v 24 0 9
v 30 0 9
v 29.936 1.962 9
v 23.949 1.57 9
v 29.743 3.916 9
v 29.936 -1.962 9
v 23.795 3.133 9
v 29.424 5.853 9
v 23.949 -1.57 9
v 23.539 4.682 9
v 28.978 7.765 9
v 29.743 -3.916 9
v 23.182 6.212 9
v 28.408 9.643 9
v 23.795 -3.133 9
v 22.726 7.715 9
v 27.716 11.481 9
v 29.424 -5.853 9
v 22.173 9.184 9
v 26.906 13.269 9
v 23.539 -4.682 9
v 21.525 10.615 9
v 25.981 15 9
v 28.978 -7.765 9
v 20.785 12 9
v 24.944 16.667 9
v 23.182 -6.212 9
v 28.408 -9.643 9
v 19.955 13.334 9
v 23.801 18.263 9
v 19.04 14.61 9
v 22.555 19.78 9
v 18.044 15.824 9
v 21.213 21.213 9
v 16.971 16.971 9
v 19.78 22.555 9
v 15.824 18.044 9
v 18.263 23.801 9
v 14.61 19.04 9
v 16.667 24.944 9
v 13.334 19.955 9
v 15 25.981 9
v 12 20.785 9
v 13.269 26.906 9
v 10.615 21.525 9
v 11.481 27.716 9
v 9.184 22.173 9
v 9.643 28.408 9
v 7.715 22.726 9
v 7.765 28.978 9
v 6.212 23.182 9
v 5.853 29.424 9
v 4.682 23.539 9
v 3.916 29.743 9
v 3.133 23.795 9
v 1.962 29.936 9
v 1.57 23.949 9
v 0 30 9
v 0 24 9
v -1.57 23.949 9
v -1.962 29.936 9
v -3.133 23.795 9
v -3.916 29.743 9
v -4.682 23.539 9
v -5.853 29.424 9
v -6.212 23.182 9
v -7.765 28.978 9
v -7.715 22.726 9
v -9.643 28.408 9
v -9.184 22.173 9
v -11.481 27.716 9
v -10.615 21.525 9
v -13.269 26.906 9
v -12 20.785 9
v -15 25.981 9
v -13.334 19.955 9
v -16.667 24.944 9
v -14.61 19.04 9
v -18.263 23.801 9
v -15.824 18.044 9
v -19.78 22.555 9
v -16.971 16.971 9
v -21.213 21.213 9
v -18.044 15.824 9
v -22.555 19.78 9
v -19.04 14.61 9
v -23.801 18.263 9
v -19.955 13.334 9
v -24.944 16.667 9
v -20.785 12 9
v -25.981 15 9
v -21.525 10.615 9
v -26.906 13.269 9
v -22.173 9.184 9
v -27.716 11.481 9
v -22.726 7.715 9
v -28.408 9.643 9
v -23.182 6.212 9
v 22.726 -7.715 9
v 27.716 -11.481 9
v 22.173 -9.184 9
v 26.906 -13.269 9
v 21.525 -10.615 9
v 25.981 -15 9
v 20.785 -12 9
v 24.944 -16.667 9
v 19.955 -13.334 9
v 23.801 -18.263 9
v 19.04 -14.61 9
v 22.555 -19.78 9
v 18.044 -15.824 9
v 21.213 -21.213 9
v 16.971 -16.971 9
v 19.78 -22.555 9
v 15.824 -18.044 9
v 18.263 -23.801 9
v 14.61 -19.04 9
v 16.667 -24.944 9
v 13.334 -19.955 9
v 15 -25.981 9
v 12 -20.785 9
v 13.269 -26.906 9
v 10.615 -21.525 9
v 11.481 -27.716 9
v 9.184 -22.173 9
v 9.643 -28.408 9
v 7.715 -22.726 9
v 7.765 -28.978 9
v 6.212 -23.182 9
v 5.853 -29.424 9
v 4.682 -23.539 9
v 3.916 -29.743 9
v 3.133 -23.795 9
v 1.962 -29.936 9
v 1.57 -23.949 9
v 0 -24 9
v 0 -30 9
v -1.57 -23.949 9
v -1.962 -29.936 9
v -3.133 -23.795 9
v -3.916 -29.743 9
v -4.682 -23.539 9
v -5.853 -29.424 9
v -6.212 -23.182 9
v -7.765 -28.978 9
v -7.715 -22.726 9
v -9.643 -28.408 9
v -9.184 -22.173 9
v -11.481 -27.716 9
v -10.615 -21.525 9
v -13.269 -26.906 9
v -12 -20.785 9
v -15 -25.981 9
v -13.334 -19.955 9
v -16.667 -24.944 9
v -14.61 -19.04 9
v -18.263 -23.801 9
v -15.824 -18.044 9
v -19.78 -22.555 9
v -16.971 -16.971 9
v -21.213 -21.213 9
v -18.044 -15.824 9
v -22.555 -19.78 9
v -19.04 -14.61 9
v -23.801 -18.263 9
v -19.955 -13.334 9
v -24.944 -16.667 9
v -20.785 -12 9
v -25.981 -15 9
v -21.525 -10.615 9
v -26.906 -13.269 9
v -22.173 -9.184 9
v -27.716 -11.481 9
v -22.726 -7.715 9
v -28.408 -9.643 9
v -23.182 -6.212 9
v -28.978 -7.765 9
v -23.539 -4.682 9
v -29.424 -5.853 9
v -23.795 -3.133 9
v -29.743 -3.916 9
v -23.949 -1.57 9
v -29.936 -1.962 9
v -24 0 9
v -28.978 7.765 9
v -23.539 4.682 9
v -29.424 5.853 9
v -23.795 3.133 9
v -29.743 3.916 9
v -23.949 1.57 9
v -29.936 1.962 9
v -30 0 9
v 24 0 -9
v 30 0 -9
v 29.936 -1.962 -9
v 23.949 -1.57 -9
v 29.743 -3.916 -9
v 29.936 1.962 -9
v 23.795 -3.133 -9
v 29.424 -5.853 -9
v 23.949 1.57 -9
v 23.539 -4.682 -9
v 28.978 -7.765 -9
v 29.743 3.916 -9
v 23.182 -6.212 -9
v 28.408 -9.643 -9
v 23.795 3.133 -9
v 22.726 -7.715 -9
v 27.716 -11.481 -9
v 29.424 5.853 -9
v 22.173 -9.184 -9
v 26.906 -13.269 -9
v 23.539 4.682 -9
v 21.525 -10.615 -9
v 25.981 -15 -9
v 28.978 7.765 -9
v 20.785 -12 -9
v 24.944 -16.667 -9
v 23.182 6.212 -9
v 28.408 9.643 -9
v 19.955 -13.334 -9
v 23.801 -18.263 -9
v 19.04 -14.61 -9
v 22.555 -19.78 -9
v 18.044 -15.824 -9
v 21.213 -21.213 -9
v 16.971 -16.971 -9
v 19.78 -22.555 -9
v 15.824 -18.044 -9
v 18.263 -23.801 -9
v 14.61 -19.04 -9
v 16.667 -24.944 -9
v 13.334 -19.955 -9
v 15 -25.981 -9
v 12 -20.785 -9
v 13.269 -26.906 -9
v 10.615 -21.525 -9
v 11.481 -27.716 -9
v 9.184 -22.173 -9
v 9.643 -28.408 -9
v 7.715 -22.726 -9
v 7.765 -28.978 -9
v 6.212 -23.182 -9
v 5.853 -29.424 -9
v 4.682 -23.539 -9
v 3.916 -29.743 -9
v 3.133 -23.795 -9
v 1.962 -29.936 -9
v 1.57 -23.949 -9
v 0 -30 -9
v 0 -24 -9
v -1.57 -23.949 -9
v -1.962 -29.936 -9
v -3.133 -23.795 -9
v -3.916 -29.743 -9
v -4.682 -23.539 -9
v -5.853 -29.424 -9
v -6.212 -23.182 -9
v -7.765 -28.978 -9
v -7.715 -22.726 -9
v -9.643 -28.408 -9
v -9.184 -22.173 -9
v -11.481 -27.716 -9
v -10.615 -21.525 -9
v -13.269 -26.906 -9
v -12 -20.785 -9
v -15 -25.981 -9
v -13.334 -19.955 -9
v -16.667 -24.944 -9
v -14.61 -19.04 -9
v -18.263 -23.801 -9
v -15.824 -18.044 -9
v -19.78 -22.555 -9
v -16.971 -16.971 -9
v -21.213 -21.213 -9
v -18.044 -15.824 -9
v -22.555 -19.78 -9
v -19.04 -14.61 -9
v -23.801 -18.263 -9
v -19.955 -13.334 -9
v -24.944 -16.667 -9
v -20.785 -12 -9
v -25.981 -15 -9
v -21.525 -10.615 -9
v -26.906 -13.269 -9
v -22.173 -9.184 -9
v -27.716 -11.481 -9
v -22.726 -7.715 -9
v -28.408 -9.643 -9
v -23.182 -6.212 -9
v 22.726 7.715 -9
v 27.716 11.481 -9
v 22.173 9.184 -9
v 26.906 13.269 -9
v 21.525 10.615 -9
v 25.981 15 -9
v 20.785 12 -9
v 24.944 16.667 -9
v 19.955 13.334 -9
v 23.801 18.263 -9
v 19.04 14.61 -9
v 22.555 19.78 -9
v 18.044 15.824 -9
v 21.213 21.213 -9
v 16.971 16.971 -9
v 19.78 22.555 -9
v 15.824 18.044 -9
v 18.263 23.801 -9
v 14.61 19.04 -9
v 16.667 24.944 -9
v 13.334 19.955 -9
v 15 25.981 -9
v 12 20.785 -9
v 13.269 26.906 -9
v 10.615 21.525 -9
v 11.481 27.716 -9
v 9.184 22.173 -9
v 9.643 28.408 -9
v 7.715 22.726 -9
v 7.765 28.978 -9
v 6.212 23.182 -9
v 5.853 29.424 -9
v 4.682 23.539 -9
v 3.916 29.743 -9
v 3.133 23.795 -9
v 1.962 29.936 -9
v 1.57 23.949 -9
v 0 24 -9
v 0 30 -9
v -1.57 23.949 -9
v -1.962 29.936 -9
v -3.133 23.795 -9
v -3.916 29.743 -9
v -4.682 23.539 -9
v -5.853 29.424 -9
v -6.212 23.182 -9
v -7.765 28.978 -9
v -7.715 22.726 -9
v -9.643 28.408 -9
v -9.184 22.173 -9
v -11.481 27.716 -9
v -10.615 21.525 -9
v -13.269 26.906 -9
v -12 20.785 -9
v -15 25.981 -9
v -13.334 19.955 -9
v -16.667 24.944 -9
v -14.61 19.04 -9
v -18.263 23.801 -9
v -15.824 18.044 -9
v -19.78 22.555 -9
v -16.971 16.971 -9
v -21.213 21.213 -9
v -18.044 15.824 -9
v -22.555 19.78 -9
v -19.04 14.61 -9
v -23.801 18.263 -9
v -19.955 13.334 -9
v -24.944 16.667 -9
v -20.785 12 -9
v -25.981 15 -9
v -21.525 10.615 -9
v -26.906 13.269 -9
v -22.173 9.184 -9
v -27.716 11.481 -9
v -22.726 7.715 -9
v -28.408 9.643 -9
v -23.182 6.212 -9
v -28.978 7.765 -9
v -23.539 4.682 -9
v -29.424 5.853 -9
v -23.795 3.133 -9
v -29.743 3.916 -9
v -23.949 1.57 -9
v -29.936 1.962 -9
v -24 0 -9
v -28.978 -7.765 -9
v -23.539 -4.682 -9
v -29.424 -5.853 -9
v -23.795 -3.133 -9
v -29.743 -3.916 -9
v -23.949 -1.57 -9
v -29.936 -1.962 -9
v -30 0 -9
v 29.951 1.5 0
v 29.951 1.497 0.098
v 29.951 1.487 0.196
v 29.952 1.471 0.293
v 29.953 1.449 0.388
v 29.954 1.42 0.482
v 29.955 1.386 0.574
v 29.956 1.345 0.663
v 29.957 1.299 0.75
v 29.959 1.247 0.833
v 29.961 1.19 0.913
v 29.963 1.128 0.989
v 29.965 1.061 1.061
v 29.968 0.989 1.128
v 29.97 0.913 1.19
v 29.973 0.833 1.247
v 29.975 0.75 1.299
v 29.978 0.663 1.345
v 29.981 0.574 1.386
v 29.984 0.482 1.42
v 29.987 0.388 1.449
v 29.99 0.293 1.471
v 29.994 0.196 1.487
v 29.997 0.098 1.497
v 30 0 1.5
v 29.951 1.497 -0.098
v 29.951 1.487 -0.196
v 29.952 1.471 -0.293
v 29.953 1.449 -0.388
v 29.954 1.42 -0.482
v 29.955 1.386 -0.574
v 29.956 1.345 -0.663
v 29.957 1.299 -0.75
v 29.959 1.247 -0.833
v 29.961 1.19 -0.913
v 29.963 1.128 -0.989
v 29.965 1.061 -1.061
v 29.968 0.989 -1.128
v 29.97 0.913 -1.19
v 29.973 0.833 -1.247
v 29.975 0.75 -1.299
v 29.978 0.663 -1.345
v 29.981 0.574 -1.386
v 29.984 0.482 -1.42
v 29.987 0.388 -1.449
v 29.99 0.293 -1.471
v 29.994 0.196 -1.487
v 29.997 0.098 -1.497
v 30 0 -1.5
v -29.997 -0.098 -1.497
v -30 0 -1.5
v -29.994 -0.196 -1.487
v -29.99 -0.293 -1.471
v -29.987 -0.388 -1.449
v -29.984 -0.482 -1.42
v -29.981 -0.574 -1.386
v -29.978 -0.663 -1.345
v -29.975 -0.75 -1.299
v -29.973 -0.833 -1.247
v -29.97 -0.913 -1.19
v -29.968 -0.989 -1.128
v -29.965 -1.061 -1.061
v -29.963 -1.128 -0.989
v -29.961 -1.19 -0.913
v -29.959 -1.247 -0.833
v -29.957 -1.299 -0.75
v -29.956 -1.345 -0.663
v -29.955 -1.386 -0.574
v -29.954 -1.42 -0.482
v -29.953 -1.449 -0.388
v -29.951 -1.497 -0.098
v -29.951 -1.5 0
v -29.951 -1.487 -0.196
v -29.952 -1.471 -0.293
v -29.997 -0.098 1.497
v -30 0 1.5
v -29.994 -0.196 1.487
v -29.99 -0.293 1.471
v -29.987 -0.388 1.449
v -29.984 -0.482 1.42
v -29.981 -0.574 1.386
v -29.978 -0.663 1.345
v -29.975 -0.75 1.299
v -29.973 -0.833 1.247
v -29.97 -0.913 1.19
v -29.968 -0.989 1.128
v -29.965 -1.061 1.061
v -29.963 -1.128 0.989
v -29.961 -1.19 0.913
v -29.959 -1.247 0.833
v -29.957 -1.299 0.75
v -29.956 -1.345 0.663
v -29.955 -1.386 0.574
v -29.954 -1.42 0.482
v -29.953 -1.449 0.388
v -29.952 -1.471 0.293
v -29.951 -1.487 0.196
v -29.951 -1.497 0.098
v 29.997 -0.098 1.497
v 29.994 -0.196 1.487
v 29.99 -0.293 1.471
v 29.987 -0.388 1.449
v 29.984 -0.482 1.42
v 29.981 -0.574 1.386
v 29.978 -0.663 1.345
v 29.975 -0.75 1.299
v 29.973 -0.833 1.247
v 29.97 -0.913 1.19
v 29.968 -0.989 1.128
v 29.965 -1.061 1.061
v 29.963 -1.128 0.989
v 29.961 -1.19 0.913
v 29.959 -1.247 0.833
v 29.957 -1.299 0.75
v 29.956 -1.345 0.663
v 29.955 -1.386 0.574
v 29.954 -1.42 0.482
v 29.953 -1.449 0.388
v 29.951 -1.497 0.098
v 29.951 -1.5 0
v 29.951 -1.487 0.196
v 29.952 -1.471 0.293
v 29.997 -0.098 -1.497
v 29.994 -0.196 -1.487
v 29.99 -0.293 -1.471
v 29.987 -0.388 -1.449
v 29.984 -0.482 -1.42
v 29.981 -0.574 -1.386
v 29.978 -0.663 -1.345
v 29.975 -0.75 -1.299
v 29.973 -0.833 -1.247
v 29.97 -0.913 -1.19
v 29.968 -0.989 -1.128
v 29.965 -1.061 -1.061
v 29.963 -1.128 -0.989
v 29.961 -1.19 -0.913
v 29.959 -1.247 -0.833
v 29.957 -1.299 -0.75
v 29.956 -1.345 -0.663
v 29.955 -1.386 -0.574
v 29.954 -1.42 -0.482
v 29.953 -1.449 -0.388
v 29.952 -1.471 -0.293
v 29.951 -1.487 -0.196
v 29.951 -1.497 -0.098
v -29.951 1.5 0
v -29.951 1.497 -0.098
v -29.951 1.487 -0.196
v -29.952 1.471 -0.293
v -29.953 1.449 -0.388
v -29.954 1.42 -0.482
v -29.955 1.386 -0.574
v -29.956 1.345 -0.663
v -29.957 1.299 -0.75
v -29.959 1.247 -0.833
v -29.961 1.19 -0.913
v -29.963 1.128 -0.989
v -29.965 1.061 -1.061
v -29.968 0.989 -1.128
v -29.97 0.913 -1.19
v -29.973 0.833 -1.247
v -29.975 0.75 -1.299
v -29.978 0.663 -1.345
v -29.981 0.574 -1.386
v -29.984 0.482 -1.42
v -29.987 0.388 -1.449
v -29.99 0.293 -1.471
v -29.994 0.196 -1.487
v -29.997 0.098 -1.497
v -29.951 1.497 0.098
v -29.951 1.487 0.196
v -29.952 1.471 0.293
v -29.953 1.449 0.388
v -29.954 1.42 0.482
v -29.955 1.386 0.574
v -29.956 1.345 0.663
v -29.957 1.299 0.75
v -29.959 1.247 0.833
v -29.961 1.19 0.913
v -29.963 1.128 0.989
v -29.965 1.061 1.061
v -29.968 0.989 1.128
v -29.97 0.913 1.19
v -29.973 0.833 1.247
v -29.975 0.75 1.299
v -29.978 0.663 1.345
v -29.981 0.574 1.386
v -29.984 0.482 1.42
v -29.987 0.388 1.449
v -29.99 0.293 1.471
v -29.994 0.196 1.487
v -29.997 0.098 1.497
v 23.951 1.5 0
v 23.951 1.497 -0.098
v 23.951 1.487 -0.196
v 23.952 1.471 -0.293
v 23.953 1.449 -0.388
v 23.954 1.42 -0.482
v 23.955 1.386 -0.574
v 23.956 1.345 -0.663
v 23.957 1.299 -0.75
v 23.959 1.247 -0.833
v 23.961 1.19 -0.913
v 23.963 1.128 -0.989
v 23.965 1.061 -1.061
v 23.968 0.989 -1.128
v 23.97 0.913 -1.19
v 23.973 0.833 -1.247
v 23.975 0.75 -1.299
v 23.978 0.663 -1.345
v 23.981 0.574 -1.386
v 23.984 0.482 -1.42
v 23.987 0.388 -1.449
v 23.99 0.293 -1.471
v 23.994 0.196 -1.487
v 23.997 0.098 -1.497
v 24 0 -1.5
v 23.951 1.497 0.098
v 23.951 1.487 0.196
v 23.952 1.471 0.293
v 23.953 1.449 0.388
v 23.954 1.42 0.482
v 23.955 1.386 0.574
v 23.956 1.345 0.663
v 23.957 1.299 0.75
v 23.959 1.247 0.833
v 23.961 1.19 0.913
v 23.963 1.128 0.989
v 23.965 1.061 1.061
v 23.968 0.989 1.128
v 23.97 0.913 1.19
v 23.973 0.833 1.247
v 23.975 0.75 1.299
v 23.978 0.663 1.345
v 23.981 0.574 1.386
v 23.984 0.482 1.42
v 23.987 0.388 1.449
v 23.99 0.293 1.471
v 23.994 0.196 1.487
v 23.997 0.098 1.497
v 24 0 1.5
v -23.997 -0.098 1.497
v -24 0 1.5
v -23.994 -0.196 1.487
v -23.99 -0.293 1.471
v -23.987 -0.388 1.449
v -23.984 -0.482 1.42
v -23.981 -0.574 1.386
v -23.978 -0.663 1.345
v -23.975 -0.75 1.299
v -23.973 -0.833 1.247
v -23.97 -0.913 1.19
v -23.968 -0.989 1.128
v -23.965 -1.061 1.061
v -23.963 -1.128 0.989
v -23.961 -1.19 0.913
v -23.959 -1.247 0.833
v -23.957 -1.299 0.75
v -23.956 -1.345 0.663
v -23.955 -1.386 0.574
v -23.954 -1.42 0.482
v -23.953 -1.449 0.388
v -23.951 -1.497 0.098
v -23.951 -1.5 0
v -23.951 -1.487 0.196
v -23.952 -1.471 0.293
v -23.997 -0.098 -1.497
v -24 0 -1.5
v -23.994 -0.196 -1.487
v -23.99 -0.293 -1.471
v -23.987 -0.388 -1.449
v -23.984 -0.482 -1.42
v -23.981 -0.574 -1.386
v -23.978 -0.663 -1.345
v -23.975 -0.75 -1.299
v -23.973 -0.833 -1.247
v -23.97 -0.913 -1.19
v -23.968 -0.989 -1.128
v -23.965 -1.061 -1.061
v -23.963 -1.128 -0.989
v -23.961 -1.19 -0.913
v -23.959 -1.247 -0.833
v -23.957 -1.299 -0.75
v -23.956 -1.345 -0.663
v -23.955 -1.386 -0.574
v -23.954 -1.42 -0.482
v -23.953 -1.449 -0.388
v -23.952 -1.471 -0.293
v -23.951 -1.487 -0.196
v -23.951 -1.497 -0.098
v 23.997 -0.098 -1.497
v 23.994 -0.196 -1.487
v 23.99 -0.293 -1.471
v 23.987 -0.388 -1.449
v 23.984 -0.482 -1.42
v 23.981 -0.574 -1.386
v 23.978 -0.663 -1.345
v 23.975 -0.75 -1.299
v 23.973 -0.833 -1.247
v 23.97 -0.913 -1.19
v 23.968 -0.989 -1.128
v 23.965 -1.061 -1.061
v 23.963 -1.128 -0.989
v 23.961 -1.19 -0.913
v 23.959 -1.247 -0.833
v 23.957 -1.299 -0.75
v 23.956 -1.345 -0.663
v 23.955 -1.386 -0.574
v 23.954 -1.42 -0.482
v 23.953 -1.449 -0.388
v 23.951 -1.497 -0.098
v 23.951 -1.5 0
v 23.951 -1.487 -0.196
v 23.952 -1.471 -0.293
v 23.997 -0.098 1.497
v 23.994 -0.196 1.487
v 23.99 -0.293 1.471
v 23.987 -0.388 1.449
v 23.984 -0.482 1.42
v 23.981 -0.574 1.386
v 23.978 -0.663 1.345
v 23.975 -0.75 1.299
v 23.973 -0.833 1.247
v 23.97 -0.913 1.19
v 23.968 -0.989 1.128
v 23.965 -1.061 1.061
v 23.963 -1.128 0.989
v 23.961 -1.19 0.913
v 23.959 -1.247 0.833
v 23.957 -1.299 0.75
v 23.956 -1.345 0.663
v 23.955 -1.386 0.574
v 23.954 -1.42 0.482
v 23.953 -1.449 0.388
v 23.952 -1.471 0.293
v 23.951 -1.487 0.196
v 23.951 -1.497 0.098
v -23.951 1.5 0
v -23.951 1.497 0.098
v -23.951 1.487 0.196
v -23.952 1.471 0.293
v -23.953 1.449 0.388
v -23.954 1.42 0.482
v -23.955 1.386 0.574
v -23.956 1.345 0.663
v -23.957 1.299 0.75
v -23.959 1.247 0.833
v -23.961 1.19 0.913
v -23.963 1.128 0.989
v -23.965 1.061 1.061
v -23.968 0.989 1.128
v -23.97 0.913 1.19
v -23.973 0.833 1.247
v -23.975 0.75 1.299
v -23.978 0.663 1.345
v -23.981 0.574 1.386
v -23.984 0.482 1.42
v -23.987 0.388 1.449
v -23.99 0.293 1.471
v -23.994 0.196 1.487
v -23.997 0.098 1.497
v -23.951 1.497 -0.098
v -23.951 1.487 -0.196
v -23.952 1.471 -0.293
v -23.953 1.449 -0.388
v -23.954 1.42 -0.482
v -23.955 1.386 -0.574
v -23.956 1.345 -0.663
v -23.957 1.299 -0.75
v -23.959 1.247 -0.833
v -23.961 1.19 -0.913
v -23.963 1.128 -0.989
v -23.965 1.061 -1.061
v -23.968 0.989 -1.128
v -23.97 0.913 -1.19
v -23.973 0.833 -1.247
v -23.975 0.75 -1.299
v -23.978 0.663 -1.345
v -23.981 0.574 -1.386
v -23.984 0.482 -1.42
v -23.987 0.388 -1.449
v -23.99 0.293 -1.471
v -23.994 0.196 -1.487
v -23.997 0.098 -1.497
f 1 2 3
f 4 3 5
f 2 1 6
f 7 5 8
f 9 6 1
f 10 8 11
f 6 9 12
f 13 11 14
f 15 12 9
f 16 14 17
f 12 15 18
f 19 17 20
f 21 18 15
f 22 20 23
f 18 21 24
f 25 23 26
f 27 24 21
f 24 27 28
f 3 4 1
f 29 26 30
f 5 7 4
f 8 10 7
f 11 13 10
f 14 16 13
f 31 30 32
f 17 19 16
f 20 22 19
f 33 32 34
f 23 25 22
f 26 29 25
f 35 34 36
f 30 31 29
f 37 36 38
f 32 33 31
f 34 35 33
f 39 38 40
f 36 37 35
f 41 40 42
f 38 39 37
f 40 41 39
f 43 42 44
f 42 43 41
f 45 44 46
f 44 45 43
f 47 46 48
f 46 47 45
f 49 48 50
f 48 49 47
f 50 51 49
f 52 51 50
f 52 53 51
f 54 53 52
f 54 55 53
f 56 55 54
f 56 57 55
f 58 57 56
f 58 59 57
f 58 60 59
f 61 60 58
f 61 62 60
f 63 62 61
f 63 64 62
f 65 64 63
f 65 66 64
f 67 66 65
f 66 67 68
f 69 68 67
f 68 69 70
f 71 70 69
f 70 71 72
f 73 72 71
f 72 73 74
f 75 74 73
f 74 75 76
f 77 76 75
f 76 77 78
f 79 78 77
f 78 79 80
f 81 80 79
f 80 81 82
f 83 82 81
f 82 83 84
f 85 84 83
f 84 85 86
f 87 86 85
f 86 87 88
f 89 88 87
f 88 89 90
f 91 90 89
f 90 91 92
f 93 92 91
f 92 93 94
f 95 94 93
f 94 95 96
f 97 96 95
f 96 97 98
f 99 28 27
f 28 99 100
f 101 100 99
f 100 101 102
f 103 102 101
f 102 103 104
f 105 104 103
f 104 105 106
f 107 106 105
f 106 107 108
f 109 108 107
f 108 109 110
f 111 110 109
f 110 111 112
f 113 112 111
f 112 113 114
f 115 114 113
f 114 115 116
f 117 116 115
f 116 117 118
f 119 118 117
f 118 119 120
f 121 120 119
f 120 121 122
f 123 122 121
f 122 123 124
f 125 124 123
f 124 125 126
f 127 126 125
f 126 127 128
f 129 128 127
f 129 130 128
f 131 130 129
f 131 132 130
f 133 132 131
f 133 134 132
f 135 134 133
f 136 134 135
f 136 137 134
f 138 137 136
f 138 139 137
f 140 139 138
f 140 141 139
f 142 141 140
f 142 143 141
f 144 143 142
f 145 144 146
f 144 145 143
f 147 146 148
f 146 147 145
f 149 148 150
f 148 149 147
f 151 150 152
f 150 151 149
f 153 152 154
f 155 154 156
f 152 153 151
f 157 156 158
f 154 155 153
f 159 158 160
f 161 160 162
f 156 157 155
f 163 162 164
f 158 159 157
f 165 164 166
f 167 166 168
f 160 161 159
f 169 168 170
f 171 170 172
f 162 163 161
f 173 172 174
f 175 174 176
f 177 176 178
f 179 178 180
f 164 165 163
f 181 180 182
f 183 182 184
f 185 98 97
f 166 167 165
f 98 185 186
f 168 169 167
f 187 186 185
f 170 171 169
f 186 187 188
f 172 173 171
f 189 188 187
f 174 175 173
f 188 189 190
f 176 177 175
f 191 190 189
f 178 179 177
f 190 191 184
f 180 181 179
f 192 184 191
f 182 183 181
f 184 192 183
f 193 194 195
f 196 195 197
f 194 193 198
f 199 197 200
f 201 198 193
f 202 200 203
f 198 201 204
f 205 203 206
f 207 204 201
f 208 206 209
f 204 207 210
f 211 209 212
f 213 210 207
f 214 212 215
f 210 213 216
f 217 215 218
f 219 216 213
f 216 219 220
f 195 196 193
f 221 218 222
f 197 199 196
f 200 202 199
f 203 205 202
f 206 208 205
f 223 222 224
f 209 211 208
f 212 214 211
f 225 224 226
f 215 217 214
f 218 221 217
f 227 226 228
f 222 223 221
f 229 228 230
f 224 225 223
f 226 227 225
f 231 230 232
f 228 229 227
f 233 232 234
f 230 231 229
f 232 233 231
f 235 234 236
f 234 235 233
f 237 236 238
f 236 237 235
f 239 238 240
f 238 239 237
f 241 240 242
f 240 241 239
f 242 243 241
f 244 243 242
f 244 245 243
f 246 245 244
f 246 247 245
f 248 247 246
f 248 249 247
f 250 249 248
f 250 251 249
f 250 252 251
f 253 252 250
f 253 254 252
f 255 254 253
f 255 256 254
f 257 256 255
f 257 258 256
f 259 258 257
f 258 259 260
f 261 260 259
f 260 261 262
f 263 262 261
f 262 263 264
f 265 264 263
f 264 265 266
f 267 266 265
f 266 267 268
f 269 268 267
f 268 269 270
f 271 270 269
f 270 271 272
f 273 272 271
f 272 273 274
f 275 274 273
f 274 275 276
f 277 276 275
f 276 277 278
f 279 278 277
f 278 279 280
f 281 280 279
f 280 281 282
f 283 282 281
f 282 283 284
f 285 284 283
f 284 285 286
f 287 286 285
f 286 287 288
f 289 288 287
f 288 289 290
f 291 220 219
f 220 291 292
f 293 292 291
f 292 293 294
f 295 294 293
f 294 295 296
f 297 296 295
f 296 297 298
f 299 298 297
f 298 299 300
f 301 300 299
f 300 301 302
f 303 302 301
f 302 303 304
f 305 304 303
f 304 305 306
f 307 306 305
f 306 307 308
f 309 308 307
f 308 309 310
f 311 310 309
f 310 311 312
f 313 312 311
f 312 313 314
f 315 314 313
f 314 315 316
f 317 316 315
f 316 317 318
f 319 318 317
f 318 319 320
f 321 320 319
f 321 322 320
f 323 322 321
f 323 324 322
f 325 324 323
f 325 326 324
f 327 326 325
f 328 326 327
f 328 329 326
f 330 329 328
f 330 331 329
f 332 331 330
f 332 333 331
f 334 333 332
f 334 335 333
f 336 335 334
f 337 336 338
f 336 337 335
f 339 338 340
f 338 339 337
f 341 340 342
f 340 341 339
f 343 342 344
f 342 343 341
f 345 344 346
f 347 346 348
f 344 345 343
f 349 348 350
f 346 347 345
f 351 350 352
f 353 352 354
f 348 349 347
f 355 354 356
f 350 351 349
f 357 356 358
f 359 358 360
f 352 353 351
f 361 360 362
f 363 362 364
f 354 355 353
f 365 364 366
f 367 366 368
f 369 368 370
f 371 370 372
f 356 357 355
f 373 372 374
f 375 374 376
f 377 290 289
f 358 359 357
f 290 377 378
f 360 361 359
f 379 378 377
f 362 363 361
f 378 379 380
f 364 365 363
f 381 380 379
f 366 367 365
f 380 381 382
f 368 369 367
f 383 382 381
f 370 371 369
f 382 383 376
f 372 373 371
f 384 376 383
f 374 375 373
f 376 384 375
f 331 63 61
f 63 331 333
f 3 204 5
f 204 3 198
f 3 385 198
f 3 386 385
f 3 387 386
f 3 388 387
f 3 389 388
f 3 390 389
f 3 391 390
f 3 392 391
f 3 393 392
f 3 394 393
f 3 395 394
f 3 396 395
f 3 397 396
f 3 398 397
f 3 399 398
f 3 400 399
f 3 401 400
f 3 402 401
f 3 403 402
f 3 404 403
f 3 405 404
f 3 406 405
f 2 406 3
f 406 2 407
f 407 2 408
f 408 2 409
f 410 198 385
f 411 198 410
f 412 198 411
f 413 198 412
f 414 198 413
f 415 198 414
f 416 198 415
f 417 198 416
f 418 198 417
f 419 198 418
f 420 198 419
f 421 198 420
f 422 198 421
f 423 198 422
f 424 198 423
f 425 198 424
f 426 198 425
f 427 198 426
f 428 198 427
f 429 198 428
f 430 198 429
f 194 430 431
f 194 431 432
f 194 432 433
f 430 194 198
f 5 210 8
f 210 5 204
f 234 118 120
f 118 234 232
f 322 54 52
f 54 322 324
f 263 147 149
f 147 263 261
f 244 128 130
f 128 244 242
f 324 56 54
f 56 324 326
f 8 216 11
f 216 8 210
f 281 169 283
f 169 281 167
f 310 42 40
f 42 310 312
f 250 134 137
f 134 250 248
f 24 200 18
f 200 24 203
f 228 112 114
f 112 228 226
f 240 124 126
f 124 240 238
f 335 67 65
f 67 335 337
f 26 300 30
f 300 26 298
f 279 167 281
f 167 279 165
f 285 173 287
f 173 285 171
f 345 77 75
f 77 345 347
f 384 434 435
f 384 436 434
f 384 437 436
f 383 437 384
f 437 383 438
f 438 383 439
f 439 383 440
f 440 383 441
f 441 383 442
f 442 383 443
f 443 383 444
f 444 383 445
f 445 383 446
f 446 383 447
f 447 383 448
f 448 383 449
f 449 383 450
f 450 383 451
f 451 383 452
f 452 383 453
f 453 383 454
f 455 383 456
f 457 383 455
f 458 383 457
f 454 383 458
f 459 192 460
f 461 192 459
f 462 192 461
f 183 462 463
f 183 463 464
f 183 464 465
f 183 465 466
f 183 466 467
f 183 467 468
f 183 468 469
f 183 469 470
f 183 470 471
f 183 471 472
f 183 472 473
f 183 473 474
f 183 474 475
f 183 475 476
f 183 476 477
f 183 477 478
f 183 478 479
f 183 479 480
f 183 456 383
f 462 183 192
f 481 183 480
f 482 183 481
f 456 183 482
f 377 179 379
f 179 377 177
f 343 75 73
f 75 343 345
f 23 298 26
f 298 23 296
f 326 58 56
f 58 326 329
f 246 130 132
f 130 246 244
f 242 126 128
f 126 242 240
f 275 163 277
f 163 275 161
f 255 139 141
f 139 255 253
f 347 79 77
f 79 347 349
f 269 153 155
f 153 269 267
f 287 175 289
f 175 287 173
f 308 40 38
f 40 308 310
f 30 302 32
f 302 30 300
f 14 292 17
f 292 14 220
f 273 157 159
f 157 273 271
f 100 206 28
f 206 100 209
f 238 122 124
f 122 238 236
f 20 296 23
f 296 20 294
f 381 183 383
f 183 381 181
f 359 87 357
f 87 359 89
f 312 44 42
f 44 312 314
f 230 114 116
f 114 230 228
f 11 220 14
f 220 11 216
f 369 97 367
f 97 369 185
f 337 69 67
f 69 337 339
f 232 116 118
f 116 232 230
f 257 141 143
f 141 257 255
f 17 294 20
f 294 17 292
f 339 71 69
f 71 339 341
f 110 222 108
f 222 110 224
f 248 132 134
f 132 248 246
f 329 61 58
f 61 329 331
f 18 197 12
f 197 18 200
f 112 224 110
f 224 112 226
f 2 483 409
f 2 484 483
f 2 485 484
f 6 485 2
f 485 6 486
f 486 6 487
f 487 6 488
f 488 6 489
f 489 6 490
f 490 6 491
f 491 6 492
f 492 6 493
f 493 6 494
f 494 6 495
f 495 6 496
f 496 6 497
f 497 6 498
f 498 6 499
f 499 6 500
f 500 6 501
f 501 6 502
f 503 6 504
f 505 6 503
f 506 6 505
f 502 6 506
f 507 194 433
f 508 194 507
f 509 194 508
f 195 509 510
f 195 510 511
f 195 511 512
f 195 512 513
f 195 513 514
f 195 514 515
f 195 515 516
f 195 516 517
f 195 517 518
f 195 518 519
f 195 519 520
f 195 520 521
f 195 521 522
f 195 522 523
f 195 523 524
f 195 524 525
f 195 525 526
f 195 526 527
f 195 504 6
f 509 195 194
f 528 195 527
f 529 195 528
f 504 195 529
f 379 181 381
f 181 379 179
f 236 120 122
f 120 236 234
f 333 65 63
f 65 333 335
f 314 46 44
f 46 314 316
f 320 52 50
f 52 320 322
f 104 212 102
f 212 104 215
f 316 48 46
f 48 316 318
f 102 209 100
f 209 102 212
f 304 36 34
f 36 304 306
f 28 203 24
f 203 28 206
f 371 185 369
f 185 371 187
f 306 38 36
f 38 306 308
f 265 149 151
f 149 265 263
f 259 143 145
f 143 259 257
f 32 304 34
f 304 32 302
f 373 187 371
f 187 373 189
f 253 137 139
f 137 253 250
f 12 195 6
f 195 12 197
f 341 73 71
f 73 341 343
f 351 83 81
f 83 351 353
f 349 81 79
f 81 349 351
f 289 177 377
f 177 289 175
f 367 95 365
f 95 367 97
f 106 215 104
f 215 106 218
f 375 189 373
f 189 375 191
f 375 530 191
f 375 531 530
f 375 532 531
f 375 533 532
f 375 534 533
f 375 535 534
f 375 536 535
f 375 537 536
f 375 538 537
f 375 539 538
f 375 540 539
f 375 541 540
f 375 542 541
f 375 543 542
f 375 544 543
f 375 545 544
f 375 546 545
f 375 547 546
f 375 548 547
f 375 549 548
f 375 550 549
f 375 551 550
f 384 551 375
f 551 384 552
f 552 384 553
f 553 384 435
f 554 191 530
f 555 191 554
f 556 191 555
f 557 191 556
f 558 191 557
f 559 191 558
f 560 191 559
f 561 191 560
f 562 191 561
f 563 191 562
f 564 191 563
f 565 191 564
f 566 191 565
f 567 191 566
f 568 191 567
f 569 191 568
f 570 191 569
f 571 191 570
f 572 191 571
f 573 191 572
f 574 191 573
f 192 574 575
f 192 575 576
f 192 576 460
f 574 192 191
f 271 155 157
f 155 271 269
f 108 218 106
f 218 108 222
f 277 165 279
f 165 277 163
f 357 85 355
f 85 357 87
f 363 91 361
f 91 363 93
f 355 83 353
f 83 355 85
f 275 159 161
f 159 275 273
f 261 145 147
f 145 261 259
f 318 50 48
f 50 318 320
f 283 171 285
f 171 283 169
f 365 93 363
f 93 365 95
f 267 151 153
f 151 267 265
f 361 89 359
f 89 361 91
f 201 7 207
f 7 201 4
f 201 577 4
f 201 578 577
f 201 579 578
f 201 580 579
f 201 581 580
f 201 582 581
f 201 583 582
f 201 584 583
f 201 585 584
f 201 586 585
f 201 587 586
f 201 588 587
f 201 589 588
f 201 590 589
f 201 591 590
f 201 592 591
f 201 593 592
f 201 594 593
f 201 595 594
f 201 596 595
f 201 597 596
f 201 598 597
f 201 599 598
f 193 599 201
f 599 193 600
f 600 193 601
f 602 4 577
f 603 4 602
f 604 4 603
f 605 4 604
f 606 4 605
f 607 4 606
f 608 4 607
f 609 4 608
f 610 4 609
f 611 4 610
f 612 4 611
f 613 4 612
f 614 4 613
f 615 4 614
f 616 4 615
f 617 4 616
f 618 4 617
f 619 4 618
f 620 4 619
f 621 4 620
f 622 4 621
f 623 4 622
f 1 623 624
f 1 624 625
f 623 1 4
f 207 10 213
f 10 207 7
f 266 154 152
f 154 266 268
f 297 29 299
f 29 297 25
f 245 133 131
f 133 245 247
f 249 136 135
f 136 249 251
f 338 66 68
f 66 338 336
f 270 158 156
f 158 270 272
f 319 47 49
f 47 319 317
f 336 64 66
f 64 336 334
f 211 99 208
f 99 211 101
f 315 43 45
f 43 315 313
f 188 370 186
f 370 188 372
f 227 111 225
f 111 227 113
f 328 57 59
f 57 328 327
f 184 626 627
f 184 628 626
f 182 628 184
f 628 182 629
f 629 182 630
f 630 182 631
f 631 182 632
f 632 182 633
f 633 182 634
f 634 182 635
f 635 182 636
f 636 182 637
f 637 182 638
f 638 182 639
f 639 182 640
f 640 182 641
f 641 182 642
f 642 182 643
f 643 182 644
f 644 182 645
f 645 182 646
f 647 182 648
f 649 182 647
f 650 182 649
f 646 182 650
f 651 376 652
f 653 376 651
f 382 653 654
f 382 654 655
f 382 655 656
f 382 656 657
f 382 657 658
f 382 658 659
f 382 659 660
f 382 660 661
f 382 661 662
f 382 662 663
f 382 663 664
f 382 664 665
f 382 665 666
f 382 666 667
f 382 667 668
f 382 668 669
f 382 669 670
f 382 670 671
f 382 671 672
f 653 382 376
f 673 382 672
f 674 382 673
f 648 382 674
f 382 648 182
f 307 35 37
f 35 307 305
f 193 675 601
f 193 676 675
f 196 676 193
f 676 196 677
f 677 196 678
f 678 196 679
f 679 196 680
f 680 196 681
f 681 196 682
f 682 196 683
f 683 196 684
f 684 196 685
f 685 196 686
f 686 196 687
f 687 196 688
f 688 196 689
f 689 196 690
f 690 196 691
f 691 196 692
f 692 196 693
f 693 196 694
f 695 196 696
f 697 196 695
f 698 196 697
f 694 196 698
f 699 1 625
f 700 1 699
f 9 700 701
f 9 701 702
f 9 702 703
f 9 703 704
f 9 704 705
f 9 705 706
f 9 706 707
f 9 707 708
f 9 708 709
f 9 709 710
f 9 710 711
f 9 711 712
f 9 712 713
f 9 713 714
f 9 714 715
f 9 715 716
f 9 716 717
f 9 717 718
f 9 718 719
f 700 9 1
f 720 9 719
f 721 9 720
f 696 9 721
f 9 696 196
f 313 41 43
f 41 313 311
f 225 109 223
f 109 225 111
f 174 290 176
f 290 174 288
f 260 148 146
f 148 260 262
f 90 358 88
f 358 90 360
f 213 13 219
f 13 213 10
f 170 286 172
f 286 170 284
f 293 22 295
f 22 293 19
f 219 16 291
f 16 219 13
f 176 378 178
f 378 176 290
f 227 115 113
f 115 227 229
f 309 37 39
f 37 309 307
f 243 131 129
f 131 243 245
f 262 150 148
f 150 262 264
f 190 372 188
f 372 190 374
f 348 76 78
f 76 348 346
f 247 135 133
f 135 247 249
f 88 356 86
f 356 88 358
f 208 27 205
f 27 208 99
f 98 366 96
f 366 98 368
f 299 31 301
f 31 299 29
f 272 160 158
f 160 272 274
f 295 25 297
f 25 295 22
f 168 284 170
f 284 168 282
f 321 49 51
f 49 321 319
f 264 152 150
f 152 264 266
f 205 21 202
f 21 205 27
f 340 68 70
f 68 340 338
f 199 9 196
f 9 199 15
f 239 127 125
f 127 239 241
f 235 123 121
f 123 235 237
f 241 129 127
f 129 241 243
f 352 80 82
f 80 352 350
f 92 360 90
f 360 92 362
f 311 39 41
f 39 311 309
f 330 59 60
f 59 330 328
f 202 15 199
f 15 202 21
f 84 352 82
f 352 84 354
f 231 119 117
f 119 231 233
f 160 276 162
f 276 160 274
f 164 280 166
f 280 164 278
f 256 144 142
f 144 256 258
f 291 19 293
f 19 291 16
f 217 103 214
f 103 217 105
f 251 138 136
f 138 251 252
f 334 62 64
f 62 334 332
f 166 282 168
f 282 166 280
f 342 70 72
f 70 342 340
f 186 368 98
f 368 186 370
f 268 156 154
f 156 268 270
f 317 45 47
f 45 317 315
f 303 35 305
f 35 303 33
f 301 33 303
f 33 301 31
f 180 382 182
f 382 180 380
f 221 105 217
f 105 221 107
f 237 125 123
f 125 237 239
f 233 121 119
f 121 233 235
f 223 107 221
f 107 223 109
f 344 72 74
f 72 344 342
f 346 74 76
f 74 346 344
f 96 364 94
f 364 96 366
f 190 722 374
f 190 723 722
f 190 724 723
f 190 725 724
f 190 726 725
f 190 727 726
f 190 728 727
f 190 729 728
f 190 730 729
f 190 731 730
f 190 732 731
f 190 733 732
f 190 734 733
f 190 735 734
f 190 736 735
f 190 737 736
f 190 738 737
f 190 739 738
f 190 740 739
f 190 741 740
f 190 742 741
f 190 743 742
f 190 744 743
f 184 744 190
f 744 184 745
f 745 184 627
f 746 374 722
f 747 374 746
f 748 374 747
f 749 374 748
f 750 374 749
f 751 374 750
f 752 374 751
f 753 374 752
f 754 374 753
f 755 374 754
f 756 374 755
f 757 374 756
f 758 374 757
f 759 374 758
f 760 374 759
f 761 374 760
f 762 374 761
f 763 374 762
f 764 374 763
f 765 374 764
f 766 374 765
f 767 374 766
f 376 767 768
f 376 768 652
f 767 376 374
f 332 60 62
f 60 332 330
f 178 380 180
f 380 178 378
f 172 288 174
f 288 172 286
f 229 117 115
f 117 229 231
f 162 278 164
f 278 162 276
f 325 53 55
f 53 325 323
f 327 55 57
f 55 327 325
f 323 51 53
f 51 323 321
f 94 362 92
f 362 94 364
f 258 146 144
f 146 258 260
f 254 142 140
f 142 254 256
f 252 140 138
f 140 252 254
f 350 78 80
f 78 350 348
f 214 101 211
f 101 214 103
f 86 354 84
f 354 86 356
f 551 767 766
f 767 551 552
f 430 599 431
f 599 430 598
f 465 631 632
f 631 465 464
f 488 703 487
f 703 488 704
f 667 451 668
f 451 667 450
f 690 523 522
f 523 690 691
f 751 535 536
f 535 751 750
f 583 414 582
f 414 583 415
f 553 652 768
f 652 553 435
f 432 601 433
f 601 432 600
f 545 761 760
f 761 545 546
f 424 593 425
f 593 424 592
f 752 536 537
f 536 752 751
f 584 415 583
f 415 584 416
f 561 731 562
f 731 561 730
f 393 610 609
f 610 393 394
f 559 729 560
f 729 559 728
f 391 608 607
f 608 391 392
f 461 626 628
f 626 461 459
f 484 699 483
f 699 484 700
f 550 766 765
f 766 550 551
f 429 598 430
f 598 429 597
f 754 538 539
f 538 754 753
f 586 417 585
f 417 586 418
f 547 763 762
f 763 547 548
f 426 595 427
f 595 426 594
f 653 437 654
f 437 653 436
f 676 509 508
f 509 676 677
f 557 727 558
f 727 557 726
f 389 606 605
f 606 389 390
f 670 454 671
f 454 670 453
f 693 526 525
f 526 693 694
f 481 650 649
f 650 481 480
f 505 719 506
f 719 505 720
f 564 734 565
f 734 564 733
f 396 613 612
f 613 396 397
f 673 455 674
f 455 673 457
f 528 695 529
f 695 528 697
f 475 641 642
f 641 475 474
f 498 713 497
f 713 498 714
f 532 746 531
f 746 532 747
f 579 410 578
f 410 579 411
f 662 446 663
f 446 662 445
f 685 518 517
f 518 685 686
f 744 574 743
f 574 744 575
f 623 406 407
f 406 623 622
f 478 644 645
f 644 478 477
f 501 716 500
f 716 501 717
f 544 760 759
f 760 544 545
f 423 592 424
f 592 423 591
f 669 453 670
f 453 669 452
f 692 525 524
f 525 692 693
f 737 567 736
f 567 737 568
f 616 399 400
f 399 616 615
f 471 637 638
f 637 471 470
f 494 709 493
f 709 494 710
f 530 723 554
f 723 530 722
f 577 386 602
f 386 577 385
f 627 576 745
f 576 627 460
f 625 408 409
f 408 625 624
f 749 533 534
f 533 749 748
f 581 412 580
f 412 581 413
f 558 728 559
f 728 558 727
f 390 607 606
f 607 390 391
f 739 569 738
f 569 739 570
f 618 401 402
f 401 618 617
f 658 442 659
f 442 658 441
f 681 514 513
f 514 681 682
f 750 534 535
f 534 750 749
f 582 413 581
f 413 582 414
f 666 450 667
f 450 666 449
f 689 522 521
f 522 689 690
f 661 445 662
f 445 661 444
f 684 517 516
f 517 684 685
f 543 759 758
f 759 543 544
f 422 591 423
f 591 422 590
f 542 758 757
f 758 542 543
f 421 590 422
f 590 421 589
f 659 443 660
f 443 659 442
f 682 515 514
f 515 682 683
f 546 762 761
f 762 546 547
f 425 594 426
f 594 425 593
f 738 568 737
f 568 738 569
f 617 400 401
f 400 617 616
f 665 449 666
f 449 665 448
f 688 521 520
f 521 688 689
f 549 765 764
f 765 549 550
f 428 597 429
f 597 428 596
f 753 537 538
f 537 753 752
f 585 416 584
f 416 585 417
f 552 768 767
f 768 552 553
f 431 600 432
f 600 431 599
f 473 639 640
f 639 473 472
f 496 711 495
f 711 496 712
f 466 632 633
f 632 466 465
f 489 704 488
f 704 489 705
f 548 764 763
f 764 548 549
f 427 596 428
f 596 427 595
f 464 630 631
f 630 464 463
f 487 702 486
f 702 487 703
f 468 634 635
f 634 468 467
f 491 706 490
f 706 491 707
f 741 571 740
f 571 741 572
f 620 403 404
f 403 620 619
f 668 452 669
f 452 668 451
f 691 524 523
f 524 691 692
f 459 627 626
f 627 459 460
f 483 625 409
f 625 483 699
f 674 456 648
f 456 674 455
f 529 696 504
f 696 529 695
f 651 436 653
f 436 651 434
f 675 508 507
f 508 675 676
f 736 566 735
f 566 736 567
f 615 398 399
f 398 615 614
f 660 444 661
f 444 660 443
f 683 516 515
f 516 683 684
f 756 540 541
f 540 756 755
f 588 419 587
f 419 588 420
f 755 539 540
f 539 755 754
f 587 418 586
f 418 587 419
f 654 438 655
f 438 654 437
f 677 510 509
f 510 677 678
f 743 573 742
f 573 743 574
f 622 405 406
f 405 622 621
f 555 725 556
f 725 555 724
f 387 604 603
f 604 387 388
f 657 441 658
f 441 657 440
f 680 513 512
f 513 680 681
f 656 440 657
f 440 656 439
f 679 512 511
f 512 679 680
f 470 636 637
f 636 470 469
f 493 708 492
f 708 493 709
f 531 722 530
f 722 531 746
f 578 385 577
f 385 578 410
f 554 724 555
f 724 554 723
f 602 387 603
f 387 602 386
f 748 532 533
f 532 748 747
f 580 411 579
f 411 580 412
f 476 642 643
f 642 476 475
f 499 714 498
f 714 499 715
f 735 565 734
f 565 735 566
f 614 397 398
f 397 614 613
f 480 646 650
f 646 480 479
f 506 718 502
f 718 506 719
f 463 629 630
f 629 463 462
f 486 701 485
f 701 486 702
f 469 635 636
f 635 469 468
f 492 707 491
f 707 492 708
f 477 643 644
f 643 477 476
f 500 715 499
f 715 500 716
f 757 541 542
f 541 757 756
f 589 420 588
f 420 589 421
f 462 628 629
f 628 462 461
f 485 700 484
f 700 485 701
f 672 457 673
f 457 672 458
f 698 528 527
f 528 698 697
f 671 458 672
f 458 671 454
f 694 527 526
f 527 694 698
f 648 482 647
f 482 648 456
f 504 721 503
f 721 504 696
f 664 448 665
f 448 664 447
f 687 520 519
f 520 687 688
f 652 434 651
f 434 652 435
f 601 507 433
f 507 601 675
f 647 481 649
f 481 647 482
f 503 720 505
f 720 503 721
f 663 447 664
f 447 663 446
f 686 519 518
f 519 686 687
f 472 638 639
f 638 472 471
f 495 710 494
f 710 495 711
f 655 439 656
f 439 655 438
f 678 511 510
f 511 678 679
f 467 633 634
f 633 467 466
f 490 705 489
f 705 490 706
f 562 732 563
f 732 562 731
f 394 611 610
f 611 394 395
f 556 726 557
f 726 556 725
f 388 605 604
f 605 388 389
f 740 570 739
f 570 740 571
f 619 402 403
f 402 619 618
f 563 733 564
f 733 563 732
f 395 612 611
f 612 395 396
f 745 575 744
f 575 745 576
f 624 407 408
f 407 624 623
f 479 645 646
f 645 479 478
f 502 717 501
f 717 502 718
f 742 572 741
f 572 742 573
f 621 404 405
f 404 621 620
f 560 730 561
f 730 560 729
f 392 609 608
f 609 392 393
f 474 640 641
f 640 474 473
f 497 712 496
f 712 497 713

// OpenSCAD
$fn=96;

module bore_hole(d=8, h=30){
    cylinder(d=d, h=h, center=true);
}

module set_screw_hole(d=3, len=40, z=0){
    translate([0,0,z])
        rotate([0,90,0])
            cylinder(d=d, h=len, center=true);
}

module hub(od=24, w=18){
    cylinder(d=od, h=w, center=true);
}

module pulley_rim(od=60, w=18){
    cylinder(d=od, h=w, center=true);
}

module v_groove(od=60, w=18, depth=6, angle=40){
    // Approximated V-groove by subtracting two opposing cones
    // Cones meet near the center to form a V profile
    cone_h = w*1.2;
    top_d = od + depth*2;
    mid_d = od - depth*2;
    union(){
        translate([0,0,0])
            cylinder(d=mid_d, h=w+0.2, center=true);
        translate([0,0, w/2])
            cylinder(d1=top_d, d2=mid_d, h=cone_h, center=false);
        translate([0,0,-w/2-cone_h])
            cylinder(d1=mid_d, d2=top_d, h=cone_h, center=false);
    }
}

module spokes(count=6, rim_od=60, hub_od=24, w=18, spoke_th=6){
    r1 = hub_od/2 + 1;
    r2 = rim_od/2 - 6;
    for(i=[0:count-1]){
        rotate([0,0,360*i/count])
            translate([(r1+r2)/2,0,0])
                cube([r2-r1, spoke_th, w], center=true);
    }
}

module pulley(){
    rim_od = 60;
    width  = 18;
    hub_od = 24;
    bore_d = 8;

    difference(){
        union(){
            // Rim
            pulley_rim(od=rim_od, w=width);

            // Hub
            hub(od=hub_od, w=width);

            // Spokes
            spokes(count=6, rim_od=rim_od, hub_od=hub_od, w=width, spoke_th=6);
        }

        // V-groove cut
        v_groove(od=rim_od, w=width, depth=6, angle=40);

        // Bore
        bore_hole(d=bore_d, h=width+10);

        // Set screw hole (radial)
        set_screw_hole(d=3, len=rim_od+20, z=0);
    }
}

pulley();
